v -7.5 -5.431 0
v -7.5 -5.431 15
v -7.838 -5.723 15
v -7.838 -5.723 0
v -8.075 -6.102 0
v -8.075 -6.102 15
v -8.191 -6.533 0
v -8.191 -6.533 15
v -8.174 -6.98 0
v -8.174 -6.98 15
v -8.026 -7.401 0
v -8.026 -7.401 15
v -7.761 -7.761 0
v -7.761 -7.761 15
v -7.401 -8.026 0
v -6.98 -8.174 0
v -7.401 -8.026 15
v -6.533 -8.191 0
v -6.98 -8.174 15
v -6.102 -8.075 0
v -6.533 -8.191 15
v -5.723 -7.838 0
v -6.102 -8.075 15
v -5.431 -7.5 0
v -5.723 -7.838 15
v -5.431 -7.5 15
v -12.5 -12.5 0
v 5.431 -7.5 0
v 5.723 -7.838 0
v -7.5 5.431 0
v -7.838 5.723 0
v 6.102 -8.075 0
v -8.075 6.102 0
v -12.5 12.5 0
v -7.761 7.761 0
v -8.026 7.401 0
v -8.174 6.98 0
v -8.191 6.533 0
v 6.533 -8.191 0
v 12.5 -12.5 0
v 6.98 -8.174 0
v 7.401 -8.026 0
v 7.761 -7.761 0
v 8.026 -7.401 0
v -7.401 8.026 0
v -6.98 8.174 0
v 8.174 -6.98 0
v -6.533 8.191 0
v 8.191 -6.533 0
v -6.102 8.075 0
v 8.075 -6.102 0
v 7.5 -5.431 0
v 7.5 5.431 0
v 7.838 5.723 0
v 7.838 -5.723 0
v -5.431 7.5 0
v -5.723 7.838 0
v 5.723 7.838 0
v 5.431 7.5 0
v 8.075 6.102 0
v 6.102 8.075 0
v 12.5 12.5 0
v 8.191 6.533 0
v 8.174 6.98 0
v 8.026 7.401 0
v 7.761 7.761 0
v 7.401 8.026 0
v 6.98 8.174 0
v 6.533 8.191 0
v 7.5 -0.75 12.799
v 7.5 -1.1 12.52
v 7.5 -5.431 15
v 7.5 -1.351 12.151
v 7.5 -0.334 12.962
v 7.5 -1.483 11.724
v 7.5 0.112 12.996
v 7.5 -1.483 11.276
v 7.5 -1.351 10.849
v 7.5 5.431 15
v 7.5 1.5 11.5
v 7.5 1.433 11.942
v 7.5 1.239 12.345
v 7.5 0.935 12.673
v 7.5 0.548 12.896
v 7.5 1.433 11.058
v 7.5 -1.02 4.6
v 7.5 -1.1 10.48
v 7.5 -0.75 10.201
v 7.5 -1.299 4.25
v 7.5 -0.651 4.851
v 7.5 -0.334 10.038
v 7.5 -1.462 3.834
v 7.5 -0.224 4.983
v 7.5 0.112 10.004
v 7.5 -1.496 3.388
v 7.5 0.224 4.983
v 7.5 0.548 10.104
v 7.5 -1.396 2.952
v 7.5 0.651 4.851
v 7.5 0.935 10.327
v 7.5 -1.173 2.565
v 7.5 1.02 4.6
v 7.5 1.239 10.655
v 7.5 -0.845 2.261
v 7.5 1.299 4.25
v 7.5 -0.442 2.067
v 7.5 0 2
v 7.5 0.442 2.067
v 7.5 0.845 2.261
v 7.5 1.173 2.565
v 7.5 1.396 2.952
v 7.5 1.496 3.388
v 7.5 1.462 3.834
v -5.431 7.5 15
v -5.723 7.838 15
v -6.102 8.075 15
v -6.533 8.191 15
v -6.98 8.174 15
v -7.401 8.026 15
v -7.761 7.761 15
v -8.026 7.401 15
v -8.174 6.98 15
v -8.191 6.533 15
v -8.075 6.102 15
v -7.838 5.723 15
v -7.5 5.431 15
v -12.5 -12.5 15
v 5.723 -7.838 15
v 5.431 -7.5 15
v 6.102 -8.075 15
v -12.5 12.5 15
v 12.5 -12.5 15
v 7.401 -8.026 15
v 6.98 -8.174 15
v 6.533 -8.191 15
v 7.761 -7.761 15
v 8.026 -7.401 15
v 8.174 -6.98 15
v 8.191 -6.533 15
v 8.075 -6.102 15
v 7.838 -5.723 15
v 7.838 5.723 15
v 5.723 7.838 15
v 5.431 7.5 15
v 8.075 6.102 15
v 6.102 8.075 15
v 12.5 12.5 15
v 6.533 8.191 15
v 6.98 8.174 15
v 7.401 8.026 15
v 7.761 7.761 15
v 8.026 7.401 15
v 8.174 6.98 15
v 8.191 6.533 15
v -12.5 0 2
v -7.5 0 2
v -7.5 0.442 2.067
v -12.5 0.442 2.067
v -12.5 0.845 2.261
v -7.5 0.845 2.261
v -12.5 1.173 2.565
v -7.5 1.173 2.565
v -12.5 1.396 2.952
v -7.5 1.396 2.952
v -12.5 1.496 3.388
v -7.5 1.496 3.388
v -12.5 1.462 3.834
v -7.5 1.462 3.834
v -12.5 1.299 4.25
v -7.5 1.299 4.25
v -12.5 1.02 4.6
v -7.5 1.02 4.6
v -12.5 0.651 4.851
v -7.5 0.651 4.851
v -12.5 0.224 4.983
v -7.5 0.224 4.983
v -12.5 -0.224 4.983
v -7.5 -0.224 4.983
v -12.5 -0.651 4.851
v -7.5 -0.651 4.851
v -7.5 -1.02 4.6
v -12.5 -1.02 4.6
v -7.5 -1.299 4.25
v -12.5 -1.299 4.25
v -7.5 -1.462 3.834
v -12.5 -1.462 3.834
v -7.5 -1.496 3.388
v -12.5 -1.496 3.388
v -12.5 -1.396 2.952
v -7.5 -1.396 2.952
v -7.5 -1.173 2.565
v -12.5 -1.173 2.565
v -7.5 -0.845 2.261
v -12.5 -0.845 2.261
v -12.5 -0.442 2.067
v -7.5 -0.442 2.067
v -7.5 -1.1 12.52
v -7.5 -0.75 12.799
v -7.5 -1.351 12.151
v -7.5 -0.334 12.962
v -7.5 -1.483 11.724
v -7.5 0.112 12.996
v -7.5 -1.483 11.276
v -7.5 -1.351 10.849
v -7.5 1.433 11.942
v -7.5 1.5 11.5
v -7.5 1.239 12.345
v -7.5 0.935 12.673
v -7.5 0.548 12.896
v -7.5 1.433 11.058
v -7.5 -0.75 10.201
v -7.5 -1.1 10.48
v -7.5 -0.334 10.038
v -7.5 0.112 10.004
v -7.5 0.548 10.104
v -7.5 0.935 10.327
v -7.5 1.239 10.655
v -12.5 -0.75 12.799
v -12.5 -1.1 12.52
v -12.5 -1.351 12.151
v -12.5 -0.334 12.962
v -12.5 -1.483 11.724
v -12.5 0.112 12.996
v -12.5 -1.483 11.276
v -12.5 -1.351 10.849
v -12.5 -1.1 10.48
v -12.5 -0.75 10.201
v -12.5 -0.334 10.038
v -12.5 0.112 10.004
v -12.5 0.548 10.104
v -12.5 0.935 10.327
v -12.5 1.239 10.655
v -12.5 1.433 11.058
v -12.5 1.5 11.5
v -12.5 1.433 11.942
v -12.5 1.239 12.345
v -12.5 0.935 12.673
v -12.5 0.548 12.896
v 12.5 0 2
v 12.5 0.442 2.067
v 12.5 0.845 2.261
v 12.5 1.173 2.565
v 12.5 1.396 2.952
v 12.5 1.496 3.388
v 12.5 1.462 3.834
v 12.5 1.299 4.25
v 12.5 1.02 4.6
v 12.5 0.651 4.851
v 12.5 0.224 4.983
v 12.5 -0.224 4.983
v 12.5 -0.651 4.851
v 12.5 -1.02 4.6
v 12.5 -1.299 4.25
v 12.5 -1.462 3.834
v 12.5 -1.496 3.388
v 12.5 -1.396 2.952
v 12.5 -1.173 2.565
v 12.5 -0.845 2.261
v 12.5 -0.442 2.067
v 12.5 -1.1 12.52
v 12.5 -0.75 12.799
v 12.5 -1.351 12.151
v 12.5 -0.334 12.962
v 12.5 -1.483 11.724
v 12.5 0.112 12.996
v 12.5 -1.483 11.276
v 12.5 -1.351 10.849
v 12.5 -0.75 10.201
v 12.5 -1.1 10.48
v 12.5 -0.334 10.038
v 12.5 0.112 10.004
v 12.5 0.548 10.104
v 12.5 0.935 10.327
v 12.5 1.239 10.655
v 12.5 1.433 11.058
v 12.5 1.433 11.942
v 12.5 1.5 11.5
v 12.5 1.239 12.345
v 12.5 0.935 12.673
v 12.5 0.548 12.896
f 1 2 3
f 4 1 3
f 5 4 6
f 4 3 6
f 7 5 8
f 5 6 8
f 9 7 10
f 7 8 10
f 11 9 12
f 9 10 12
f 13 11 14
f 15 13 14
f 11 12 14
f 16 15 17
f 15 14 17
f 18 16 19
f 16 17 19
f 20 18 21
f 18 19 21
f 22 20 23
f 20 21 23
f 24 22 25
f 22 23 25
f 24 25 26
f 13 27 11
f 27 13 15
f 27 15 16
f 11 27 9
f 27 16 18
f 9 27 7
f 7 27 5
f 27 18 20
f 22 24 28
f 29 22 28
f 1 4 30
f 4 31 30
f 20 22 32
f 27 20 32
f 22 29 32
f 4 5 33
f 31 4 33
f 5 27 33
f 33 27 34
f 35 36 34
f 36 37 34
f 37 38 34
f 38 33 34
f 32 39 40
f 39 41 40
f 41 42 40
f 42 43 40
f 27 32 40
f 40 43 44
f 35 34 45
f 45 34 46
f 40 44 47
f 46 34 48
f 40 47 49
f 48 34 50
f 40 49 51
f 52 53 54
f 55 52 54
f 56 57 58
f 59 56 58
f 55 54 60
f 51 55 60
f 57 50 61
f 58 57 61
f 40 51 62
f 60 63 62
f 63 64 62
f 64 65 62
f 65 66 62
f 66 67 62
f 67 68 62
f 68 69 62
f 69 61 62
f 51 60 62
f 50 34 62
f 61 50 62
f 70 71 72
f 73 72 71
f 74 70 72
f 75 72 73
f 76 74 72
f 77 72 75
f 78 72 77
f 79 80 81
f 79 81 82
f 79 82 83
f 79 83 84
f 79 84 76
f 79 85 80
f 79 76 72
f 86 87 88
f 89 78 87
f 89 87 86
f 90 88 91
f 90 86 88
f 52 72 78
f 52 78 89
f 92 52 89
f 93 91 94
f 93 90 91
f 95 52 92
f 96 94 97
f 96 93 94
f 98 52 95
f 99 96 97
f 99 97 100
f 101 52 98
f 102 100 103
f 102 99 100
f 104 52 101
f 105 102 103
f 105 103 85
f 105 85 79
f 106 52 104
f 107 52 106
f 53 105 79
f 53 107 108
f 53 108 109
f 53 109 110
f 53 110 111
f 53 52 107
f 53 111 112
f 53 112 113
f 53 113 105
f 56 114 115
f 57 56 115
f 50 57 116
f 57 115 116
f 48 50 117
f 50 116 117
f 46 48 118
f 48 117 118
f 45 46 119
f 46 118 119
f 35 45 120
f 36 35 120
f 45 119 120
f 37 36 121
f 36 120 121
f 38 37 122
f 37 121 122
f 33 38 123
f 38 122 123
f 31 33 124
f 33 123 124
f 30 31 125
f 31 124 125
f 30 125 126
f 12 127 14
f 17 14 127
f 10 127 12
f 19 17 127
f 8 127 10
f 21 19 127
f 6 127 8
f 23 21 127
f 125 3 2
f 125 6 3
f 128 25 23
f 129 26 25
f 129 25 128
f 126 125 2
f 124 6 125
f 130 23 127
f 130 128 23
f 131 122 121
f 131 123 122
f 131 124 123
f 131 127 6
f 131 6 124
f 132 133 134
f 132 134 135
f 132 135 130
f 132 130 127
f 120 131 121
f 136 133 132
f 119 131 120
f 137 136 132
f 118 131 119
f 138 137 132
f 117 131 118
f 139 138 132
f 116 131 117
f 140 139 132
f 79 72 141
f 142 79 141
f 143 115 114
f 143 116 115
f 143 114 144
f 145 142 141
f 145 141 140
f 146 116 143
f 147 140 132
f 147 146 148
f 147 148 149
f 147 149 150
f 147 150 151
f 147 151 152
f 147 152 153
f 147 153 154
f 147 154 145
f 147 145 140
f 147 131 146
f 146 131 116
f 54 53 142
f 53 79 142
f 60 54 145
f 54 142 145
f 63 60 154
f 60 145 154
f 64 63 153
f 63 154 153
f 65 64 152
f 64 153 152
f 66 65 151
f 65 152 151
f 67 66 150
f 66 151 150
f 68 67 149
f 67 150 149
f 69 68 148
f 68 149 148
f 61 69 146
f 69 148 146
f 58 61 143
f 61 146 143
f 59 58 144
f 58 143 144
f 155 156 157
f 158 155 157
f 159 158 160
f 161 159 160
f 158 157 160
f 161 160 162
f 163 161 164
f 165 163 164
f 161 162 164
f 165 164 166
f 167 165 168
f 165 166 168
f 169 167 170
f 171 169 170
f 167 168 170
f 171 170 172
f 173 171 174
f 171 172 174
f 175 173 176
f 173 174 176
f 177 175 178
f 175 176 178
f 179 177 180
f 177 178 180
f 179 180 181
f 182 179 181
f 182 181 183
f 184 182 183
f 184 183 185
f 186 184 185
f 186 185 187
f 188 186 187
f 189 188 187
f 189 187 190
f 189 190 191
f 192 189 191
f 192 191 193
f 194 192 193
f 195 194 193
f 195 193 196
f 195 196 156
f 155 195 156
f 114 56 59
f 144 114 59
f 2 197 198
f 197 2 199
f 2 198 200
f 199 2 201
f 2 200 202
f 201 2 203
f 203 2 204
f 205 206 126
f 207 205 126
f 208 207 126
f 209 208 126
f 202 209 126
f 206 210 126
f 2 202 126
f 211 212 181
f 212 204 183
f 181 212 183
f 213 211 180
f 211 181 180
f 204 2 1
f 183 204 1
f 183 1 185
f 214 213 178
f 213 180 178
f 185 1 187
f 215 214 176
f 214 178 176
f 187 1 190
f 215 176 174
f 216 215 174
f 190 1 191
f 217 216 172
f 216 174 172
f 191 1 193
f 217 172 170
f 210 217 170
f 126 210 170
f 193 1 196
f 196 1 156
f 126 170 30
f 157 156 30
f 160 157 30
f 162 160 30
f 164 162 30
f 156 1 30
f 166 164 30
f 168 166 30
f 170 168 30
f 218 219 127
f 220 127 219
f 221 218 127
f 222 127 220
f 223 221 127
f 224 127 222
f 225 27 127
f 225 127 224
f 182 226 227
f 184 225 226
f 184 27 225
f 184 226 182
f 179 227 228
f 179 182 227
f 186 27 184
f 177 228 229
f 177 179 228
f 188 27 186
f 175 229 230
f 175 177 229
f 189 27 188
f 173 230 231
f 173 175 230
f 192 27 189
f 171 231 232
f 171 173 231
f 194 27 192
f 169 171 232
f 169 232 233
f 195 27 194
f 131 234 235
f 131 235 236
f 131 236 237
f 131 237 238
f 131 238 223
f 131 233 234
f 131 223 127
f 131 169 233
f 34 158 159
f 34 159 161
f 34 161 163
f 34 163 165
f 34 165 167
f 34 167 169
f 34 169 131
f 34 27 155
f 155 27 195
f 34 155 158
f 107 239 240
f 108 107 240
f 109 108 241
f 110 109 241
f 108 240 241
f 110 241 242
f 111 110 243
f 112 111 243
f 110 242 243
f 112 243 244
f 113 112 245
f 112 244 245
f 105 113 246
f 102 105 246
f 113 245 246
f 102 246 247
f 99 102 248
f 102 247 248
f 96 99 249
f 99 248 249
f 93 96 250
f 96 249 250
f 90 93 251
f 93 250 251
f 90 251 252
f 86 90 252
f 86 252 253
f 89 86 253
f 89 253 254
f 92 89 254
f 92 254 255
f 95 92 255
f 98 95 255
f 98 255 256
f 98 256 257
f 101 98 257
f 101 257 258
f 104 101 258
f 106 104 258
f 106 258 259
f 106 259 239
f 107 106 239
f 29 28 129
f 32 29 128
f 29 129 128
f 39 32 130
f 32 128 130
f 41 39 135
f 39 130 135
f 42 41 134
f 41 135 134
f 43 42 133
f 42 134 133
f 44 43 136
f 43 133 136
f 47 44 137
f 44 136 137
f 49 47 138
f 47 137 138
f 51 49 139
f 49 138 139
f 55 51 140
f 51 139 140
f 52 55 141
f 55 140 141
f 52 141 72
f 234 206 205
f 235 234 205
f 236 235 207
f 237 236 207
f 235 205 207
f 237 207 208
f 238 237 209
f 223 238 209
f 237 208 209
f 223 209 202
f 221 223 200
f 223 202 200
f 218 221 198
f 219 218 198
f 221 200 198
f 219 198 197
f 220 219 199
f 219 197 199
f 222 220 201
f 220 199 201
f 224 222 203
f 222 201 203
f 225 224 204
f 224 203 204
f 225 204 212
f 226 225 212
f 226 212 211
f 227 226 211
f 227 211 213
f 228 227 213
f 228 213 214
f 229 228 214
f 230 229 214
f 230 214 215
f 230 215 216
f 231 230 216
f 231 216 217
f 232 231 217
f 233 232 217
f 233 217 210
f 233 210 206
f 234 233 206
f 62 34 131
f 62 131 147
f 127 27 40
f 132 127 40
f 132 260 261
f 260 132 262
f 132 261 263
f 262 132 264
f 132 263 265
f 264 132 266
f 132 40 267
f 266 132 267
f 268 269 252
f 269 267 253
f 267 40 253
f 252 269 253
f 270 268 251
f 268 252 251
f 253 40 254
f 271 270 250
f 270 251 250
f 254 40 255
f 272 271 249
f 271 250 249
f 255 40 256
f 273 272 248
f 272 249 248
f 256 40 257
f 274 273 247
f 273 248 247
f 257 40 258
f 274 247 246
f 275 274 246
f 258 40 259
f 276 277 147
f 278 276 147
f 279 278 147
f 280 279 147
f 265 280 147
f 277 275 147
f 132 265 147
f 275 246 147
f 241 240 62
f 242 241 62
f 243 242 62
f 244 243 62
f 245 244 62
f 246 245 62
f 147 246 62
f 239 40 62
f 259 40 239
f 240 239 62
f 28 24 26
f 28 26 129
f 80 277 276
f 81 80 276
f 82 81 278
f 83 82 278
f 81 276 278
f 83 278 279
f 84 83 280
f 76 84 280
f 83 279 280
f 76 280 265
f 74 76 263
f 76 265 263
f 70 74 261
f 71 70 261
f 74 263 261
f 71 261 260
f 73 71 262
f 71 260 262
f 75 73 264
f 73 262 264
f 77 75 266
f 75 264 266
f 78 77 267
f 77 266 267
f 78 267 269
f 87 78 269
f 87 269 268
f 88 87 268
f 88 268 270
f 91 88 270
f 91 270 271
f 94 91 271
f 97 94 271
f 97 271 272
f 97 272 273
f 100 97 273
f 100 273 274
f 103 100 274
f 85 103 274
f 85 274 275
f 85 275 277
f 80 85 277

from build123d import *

# Parameters (mm, degrees)
SKETCH_1_W          = 25
SKETCH_1_H          = 25
SKETCH_1_W_2        = 15
SKETCH_1_H_2        = 15
EXTRUDE_1_DEPTH     = 15
SKETCH_2_R          = 1.5
CUT_EXTRUDE_1_DEPTH = 24.184046239
SKETCH_3_R          = 1.5
CUT_EXTRUDE_2_DEPTH = 32.721443851


with BuildPart() as part:
    # 草图1 → 凸台-拉伸1 (new body)
    with BuildSketch(Plane.XY):
        Rectangle(SKETCH_1_W, SKETCH_1_H)
        Rectangle(SKETCH_1_W_2, SKETCH_1_H_2, mode=Mode.SUBTRACT)
    extrude(amount=EXTRUDE_1_DEPTH)

    # 草图2 → 切除-拉伸1 (cut, through all)
    with BuildSketch(Plane.XY.offset(15)):
        with Locations((6.7, 6.7)):
            Circle(SKETCH_2_R)
        with Locations((6.7, -6.7)):
            Circle(SKETCH_2_R)
        with Locations((-6.7, -6.7)):
            Circle(SKETCH_2_R)
        with Locations((-6.7, 6.7)):
            Circle(SKETCH_2_R)
    extrude(amount=-CUT_EXTRUDE_1_DEPTH, mode=Mode.SUBTRACT)

    # 草图3 → 切除-拉伸2 (cut, through all)
    with BuildSketch(Plane(origin=(12.5, 0, 0), x_dir=(0, 0, -1), z_dir=(1, 0, 0))):
        with Locations(Location((-11.5, 0, 0), (0, 0, 90))):
            Circle(SKETCH_3_R)
        with Locations((-3.5, 0)):
            Circle(SKETCH_3_R)
    extrude(amount=-CUT_EXTRUDE_2_DEPTH, mode=Mode.SUBTRACT)


solid = part.part
